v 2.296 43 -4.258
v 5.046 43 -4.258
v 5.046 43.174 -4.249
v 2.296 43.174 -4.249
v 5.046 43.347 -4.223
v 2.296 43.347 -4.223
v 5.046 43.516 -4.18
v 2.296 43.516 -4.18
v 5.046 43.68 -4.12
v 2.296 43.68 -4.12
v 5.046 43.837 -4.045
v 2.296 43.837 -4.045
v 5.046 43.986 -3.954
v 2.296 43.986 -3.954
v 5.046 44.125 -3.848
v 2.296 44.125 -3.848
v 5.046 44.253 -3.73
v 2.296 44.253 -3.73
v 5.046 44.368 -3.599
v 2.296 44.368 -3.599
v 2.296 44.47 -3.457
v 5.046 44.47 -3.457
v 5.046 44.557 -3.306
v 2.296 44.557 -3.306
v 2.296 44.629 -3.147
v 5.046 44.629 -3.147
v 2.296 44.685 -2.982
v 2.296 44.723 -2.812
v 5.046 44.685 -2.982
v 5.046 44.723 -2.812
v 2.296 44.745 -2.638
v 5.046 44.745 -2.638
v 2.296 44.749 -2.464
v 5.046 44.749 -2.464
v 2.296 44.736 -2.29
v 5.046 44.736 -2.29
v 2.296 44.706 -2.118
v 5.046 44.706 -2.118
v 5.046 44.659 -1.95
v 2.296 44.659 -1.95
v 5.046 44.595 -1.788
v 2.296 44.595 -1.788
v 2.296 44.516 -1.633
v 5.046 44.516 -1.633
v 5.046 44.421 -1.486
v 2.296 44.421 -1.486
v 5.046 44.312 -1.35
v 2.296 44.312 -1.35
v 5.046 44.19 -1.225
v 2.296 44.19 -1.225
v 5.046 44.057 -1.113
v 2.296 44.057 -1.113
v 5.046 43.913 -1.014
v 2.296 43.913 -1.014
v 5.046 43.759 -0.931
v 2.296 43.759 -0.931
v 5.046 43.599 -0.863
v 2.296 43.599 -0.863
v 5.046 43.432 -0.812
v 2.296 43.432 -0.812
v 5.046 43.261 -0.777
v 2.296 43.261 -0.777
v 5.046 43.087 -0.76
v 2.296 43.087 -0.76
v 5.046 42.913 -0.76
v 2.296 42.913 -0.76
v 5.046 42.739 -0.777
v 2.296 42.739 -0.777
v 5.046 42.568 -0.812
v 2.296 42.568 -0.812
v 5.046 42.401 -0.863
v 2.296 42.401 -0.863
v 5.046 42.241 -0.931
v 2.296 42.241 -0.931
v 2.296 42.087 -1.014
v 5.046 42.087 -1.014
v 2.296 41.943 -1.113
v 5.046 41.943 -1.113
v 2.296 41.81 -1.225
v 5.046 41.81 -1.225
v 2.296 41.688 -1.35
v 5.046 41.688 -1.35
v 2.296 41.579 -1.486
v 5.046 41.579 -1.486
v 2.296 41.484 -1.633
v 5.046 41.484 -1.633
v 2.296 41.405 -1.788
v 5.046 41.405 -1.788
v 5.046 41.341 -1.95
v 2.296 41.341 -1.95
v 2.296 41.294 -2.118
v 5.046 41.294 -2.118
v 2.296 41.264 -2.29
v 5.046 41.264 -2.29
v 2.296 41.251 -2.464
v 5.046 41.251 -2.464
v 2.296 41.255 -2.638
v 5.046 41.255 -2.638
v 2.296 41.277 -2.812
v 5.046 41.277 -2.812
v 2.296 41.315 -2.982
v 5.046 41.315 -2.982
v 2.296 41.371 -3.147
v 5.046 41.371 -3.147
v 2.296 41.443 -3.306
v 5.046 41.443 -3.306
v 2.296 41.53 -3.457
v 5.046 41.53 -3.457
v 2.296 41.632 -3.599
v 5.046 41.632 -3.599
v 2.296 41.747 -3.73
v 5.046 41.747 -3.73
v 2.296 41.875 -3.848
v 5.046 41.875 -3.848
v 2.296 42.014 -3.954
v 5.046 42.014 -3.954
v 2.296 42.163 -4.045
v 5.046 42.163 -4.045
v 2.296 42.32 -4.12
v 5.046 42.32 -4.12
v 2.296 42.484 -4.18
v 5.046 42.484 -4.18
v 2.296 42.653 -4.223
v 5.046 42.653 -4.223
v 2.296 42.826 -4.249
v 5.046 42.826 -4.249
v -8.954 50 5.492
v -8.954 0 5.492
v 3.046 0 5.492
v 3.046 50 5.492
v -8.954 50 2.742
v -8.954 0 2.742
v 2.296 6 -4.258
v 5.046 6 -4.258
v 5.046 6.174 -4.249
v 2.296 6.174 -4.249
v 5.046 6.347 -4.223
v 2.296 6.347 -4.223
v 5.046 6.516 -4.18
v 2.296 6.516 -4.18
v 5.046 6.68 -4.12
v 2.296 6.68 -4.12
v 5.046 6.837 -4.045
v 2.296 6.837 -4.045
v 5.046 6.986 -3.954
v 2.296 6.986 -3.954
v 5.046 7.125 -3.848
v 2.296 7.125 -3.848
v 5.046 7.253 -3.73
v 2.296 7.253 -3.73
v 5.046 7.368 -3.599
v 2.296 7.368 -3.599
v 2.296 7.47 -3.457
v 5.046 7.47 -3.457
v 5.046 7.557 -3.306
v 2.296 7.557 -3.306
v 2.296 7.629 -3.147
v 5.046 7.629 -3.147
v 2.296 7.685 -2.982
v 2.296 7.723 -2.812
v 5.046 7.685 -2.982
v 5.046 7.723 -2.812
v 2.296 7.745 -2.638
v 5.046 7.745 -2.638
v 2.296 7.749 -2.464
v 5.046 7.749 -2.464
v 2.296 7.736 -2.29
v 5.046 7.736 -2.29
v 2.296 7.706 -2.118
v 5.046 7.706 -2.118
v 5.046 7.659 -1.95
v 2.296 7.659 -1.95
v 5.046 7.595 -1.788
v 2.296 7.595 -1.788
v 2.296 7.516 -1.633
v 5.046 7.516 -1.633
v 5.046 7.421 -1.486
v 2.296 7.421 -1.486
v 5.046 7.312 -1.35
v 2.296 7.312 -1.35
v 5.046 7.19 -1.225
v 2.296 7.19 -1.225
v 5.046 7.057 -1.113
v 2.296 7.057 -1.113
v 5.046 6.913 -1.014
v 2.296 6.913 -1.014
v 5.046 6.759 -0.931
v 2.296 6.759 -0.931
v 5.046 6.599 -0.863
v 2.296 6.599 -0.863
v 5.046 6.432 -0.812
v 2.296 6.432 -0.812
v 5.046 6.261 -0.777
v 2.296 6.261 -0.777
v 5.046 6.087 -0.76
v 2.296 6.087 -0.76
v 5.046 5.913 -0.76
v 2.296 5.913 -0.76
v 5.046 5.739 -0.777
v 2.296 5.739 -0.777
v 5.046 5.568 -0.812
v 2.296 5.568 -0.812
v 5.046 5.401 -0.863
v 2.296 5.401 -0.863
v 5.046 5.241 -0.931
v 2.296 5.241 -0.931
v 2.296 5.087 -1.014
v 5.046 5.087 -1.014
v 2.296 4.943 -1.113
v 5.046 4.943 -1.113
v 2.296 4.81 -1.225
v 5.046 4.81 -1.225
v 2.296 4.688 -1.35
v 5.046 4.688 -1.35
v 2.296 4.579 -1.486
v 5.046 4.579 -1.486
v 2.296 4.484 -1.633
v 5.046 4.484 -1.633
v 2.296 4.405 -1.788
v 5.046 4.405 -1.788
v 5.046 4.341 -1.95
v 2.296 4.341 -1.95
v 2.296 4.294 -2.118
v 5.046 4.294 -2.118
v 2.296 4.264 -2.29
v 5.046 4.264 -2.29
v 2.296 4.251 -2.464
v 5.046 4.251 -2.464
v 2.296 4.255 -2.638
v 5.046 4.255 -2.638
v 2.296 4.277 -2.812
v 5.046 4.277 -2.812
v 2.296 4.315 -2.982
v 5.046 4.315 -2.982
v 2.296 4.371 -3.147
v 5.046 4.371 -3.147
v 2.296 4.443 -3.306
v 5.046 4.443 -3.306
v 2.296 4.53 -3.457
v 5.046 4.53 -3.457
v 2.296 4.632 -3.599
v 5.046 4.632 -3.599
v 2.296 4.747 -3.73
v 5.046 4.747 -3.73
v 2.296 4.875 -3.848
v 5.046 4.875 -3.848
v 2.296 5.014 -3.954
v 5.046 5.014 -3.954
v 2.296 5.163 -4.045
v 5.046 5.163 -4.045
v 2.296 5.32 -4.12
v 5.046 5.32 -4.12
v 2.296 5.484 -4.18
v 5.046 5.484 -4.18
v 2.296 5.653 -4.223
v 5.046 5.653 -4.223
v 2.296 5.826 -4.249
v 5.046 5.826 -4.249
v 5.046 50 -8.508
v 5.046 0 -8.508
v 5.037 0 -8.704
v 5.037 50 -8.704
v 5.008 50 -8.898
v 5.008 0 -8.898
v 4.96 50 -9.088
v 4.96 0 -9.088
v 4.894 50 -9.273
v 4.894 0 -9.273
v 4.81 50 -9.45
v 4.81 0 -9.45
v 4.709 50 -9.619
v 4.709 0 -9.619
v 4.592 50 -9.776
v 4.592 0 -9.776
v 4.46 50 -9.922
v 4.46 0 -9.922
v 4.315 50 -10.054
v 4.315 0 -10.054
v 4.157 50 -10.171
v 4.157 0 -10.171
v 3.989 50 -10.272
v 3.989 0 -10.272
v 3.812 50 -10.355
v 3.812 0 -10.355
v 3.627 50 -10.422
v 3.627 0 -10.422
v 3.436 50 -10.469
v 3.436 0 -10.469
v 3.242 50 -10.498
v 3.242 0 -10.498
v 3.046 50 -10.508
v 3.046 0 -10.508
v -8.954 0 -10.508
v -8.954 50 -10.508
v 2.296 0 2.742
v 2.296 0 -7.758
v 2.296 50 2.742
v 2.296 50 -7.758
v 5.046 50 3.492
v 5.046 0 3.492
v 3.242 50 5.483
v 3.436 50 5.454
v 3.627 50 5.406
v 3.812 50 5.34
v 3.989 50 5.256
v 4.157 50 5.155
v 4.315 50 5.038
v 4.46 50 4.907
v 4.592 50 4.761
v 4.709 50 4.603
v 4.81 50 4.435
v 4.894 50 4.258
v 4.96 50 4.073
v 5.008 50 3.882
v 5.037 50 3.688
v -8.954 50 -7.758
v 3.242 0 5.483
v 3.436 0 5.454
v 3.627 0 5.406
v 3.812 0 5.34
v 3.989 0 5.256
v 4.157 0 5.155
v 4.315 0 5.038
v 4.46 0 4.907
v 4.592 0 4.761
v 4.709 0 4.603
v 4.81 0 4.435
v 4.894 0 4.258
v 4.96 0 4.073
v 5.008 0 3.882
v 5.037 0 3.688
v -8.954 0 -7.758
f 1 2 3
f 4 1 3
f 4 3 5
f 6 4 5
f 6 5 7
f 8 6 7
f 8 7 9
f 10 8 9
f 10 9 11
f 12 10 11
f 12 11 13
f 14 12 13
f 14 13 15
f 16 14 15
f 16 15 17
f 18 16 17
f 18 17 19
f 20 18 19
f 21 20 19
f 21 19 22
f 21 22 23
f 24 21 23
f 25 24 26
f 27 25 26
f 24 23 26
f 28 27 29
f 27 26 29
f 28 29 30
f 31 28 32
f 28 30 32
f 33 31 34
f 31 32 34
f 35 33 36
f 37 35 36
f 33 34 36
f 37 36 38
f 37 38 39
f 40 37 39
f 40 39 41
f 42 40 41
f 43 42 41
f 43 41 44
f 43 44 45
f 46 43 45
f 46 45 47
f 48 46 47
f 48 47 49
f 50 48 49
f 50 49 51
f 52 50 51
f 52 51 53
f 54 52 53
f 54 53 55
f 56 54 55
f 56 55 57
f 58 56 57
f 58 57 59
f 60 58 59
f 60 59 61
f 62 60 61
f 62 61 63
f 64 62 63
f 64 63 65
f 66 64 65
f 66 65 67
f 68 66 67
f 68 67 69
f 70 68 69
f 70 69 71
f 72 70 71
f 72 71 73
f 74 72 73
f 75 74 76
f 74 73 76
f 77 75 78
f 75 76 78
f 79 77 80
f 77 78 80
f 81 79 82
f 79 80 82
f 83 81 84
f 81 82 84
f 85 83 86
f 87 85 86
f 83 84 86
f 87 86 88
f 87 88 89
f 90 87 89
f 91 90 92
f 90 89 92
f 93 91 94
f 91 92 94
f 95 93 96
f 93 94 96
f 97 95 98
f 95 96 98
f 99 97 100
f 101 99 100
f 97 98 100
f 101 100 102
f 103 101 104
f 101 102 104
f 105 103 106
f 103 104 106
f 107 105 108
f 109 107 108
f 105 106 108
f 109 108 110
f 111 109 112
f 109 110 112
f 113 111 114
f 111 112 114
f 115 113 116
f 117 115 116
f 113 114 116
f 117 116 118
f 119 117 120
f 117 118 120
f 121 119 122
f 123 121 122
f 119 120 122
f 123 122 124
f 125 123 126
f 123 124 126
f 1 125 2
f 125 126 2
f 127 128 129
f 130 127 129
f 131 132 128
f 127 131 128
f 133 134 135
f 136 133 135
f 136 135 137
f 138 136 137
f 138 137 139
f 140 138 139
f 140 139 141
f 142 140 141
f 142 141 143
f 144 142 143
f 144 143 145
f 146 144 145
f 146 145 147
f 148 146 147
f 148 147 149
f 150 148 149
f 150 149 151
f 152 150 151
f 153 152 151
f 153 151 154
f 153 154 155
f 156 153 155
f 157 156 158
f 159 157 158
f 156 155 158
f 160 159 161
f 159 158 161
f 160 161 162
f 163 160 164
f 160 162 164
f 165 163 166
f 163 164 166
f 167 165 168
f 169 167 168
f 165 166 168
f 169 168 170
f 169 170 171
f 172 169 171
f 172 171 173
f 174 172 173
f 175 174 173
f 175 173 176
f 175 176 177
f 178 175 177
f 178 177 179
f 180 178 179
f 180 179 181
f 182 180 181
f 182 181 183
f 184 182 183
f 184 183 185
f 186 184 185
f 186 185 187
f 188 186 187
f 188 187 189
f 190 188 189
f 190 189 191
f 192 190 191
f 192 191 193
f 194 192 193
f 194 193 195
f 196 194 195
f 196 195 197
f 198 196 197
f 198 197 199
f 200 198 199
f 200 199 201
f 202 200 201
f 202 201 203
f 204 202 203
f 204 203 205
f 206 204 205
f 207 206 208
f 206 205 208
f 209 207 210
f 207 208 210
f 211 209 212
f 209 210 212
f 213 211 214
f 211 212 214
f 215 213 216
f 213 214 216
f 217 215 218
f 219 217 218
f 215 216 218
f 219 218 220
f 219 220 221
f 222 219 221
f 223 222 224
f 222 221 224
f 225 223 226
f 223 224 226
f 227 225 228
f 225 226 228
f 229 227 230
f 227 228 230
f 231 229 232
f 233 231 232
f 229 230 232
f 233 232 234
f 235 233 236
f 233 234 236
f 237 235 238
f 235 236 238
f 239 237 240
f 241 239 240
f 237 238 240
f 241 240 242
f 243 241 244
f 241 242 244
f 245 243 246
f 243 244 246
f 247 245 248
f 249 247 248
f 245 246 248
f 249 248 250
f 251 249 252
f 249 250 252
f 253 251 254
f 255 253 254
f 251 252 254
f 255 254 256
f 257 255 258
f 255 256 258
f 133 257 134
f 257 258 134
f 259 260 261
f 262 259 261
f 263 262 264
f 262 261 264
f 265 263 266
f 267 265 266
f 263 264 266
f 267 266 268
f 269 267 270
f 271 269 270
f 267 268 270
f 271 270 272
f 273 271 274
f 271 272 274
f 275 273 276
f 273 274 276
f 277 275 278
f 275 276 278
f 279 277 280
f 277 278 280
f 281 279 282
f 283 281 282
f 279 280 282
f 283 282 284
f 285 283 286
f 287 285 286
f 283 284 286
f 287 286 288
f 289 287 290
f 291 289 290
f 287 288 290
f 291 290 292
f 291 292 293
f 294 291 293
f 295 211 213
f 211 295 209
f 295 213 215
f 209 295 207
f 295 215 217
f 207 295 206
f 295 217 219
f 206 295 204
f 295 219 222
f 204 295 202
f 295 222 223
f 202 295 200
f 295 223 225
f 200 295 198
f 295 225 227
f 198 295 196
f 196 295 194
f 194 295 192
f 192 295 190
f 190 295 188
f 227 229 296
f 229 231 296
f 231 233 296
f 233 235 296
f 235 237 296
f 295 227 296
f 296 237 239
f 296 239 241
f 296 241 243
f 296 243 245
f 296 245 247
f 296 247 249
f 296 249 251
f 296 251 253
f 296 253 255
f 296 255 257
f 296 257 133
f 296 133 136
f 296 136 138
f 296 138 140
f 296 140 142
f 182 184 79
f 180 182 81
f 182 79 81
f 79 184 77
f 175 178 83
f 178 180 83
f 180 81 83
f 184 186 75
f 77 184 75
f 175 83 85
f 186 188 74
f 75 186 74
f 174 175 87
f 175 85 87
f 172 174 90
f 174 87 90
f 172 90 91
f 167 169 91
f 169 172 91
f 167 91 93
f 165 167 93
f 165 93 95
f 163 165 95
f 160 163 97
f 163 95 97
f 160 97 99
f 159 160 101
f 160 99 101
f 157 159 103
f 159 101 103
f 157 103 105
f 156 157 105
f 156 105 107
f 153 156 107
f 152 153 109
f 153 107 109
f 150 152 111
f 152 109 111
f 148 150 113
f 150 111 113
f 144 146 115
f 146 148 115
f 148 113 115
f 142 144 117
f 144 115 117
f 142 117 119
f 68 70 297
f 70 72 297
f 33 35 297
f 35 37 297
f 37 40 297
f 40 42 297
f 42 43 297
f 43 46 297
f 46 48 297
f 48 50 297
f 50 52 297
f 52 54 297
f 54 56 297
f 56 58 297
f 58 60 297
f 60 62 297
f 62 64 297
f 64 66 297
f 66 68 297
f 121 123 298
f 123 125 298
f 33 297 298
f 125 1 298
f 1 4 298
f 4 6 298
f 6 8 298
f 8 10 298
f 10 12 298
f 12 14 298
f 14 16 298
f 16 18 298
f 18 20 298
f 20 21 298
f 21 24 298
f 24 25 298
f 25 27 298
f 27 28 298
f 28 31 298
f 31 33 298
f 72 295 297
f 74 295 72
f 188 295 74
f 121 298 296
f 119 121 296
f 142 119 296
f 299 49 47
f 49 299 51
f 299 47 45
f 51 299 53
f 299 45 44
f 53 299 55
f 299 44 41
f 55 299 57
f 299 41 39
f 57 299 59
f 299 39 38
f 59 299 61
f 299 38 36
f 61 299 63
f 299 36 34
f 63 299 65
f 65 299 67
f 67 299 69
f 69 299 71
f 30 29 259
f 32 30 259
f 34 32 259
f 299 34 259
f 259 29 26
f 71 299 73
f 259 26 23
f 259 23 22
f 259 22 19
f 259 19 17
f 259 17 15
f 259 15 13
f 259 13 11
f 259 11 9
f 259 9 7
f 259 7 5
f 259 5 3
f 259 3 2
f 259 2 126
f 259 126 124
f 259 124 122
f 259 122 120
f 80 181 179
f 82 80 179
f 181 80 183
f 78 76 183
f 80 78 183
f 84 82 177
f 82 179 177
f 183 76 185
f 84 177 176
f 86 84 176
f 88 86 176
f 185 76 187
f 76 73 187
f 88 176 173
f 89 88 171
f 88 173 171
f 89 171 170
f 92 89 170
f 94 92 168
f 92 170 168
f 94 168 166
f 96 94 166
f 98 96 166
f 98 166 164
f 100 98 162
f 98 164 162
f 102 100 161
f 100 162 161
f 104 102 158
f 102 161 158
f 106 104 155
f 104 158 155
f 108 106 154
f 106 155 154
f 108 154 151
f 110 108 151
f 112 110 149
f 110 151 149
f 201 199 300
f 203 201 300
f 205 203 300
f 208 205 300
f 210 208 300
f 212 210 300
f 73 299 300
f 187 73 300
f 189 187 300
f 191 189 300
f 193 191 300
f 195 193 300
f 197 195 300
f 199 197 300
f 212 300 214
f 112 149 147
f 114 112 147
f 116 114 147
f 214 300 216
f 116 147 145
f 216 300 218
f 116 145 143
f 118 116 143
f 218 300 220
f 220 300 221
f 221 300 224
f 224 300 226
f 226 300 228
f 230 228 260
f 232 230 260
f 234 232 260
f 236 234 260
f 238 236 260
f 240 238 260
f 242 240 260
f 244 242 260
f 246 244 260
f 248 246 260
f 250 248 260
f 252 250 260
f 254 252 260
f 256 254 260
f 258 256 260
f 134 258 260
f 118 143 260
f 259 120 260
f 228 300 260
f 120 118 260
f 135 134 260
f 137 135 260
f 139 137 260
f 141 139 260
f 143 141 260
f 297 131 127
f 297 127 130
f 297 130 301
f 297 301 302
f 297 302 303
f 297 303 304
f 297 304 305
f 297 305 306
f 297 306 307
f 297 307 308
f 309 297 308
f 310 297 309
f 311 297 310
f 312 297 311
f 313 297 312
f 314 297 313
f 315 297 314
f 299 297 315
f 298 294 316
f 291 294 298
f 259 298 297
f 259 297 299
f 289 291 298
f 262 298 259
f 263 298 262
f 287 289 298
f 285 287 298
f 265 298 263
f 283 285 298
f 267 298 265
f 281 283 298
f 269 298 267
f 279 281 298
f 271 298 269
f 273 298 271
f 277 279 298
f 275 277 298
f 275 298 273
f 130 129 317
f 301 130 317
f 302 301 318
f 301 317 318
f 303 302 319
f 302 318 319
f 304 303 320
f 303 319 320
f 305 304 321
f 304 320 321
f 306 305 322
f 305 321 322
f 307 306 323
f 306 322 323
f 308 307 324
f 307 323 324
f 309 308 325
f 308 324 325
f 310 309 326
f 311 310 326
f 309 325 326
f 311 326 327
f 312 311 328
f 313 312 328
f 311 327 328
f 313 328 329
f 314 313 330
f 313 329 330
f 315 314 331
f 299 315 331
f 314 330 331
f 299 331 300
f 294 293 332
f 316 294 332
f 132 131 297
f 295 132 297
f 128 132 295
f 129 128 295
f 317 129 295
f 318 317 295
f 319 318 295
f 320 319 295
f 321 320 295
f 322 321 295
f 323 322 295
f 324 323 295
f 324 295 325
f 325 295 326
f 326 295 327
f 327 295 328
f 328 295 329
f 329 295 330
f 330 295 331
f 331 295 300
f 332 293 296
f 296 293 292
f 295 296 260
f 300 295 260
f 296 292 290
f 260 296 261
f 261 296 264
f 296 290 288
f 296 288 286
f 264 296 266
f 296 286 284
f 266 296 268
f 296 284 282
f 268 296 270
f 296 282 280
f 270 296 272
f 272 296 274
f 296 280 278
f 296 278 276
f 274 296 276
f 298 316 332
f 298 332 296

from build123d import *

# Parameters (mm, degrees)
EXTRUDE_1_DEPTH     = 50
SKETCH_2_W          = 8.5
SKETCH_2_H          = 10.5
CUT_EXTRUDE_1_DEPTH = 52.870829554
SKETCH_3_W          = 2.75
SKETCH_3_H          = 10.5
CUT_EXTRUDE_2_DEPTH = 52.870829554
SKETCH_4_R          = 1.75
CUT_EXTRUDE_3_DEPTH = 53.975575482


with BuildPart() as part:
    # 草图1 → 凸台-拉伸1 (new body)
    with BuildSketch(Plane(origin=(0, 0, 0), x_dir=(1, 0, 0), z_dir=(0, 1, 0))):
        with BuildLine():
            Line((-8.953846154, 10.507692308), (-8.953846154, -5.492307692))
            Line((-8.953846154, -5.492307692), (3.046153846, -5.492307692))
            ThreePointArc((3.046153846, -5.492307692), (4.460367409, -4.906521255), (5.046153846, -3.492307692))
            Line((5.046153846, -3.492307692), (5.046153846, 8.507692308))
            ThreePointArc((5.046153846, 8.507692308), (4.460367409, 9.92190587), (3.046153846, 10.507692308))
            Line((3.046153846, 10.507692308), (-8.953846154, 10.507692308))
        make_face()
    extrude(amount=EXTRUDE_1_DEPTH)

    # 草图2 → 切除-拉伸1 (cut, through all)
    with BuildSketch(Plane(origin=(0, 50, 0), x_dir=(1, 0, 0), z_dir=(0, 1, 0))):
        with Locations((-1.953846154, 2.507692308)):
            Rectangle(SKETCH_2_W, SKETCH_2_H)
    extrude(amount=-CUT_EXTRUDE_1_DEPTH, mode=Mode.SUBTRACT)

    # 草图3 → 切除-拉伸2 (cut, through all)
    with BuildSketch(Plane(origin=(0, 50, 0), x_dir=(1, 0, 0), z_dir=(0, 1, 0))):
        with Locations((-7.578846154, 2.507692308)):
            Rectangle(SKETCH_3_W, SKETCH_3_H)
    extrude(amount=-CUT_EXTRUDE_2_DEPTH, mode=Mode.SUBTRACT)

    # 草图4 → 切除-拉伸3 (cut, through all)
    with BuildSketch(Plane(origin=(5.046153846, 0, 0), x_dir=(0, 0, -1), z_dir=(1, 0, 0))):
        with Locations((2.507692308, 43)):
            Circle(SKETCH_4_R)
        with Locations((2.507692308, 6)):
            Circle(SKETCH_4_R)
    extrude(amount=-CUT_EXTRUDE_3_DEPTH, mode=Mode.SUBTRACT)


solid = part.part
